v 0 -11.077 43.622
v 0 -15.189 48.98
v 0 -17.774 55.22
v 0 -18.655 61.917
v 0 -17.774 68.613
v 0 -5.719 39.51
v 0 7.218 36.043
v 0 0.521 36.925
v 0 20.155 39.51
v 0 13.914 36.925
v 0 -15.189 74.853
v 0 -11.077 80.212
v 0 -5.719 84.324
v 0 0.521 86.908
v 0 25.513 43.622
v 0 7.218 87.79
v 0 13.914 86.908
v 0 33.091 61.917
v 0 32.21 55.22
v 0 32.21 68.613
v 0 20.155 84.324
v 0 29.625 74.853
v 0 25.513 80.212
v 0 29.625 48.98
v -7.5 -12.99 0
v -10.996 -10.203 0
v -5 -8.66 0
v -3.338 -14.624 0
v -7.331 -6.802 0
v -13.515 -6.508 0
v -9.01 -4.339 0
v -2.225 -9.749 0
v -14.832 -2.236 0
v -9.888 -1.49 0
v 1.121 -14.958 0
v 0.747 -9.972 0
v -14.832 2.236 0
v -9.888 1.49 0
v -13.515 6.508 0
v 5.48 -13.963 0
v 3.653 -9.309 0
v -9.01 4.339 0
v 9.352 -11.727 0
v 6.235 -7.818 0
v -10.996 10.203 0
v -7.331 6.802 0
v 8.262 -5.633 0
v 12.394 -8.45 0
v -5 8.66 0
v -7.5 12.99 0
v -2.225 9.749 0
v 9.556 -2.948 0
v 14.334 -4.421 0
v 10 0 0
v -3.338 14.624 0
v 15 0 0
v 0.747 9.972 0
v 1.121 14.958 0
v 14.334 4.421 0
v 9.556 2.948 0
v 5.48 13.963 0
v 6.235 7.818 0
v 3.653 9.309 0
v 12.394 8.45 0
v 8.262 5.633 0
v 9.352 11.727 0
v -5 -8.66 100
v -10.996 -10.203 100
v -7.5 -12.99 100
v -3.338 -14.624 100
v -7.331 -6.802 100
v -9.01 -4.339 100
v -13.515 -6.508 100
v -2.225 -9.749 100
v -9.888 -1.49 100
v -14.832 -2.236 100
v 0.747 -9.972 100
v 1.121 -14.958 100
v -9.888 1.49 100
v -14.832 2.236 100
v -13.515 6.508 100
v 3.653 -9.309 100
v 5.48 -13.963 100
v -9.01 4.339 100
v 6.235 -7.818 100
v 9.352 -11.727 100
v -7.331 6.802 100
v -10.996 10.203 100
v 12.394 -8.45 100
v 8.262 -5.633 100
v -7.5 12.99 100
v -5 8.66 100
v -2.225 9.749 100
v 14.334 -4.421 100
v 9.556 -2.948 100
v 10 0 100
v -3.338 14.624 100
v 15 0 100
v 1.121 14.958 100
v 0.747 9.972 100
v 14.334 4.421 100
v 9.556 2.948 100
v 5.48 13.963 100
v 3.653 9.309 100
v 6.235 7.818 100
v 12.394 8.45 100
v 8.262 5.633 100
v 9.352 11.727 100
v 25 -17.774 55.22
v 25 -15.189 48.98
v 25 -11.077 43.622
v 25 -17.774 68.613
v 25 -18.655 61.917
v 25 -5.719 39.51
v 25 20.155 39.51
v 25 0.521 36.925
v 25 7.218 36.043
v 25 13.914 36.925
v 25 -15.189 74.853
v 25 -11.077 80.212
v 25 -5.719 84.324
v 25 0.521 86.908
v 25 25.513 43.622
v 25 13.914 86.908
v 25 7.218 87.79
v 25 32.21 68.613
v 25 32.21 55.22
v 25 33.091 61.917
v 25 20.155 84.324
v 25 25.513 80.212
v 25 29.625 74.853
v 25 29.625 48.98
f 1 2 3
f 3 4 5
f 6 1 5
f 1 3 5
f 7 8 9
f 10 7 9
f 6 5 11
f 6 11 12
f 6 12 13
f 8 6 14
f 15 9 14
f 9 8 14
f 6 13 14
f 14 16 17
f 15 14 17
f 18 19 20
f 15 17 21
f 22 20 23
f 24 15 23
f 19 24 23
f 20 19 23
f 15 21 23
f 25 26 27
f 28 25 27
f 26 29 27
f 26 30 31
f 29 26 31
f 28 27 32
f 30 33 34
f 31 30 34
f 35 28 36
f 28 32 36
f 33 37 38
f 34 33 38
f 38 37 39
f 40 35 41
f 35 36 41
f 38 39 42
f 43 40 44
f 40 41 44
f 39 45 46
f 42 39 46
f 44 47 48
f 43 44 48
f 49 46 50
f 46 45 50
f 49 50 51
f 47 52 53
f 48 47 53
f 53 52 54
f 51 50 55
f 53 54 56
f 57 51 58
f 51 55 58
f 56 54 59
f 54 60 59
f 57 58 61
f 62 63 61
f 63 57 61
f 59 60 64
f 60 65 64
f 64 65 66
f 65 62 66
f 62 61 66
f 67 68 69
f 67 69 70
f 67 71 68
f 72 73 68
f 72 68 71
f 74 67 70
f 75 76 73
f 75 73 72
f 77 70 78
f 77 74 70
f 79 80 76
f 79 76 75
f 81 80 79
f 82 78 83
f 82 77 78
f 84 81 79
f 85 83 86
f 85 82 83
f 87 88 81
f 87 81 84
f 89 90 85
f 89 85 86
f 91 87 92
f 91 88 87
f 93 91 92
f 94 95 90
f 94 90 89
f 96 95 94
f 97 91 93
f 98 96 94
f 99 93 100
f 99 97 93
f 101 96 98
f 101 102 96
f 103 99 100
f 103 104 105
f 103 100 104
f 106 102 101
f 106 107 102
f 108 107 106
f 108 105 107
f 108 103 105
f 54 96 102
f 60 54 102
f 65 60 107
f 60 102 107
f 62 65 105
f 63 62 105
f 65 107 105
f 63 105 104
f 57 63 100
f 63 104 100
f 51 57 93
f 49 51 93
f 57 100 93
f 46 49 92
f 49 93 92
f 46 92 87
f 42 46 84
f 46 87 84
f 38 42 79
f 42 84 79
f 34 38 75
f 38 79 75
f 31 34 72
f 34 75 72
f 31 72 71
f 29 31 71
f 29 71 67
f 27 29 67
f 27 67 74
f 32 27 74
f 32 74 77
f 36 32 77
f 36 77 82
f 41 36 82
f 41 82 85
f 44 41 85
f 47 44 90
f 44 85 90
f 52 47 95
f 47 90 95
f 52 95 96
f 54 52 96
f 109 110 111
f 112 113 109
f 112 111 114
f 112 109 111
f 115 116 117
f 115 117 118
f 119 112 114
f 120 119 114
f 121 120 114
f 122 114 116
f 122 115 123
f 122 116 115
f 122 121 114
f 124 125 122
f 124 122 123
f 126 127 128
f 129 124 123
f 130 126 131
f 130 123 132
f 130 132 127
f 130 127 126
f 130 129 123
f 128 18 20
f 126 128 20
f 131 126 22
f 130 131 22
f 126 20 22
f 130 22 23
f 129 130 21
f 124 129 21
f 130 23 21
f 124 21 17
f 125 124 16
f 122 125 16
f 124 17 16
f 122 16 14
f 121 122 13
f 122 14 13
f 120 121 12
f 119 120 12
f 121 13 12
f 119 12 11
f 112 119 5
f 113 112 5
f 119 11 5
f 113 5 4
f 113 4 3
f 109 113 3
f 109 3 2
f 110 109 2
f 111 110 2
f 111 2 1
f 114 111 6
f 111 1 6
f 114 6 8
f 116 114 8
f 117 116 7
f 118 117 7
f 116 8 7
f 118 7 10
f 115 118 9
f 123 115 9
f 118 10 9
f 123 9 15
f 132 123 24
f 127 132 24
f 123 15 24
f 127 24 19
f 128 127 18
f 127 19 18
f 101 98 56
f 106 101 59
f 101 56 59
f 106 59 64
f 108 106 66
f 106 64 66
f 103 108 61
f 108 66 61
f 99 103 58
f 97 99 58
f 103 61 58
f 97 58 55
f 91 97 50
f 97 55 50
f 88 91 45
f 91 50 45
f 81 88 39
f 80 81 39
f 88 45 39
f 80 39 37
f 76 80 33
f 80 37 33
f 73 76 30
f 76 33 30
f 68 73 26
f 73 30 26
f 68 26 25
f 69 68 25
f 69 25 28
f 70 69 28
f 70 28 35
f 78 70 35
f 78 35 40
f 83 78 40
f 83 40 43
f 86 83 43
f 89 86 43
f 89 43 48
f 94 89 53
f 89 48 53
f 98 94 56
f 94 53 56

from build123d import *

# Parameters (mm, degrees)
F0_R     = 15
F1_DEPTH = 100
F3_R     = 10
F4_DEPTH = 100
F5_R     = 25.87329
F6_DEPTH = 25


with BuildPart() as f1:
    # F0 (on Top) → F1 (new body)
    with BuildSketch(Plane.XY):
        Circle(F0_R)
    extrude(amount=F1_DEPTH)

    # F3 (on face) → F4 (cut, through all)
    with BuildSketch(Plane.XY.offset(100)):
        Circle(F3_R)
    extrude(amount=-F4_DEPTH, mode=Mode.SUBTRACT)


with BuildPart() as f6:
    # F5 (on Right) → F6 (new body)
    with BuildSketch(Plane.YZ):
        with Locations((7.217973, 61.916694)):
            Circle(F5_R)
    extrude(amount=F6_DEPTH)


solid = Compound([f1.part, f6.part])
